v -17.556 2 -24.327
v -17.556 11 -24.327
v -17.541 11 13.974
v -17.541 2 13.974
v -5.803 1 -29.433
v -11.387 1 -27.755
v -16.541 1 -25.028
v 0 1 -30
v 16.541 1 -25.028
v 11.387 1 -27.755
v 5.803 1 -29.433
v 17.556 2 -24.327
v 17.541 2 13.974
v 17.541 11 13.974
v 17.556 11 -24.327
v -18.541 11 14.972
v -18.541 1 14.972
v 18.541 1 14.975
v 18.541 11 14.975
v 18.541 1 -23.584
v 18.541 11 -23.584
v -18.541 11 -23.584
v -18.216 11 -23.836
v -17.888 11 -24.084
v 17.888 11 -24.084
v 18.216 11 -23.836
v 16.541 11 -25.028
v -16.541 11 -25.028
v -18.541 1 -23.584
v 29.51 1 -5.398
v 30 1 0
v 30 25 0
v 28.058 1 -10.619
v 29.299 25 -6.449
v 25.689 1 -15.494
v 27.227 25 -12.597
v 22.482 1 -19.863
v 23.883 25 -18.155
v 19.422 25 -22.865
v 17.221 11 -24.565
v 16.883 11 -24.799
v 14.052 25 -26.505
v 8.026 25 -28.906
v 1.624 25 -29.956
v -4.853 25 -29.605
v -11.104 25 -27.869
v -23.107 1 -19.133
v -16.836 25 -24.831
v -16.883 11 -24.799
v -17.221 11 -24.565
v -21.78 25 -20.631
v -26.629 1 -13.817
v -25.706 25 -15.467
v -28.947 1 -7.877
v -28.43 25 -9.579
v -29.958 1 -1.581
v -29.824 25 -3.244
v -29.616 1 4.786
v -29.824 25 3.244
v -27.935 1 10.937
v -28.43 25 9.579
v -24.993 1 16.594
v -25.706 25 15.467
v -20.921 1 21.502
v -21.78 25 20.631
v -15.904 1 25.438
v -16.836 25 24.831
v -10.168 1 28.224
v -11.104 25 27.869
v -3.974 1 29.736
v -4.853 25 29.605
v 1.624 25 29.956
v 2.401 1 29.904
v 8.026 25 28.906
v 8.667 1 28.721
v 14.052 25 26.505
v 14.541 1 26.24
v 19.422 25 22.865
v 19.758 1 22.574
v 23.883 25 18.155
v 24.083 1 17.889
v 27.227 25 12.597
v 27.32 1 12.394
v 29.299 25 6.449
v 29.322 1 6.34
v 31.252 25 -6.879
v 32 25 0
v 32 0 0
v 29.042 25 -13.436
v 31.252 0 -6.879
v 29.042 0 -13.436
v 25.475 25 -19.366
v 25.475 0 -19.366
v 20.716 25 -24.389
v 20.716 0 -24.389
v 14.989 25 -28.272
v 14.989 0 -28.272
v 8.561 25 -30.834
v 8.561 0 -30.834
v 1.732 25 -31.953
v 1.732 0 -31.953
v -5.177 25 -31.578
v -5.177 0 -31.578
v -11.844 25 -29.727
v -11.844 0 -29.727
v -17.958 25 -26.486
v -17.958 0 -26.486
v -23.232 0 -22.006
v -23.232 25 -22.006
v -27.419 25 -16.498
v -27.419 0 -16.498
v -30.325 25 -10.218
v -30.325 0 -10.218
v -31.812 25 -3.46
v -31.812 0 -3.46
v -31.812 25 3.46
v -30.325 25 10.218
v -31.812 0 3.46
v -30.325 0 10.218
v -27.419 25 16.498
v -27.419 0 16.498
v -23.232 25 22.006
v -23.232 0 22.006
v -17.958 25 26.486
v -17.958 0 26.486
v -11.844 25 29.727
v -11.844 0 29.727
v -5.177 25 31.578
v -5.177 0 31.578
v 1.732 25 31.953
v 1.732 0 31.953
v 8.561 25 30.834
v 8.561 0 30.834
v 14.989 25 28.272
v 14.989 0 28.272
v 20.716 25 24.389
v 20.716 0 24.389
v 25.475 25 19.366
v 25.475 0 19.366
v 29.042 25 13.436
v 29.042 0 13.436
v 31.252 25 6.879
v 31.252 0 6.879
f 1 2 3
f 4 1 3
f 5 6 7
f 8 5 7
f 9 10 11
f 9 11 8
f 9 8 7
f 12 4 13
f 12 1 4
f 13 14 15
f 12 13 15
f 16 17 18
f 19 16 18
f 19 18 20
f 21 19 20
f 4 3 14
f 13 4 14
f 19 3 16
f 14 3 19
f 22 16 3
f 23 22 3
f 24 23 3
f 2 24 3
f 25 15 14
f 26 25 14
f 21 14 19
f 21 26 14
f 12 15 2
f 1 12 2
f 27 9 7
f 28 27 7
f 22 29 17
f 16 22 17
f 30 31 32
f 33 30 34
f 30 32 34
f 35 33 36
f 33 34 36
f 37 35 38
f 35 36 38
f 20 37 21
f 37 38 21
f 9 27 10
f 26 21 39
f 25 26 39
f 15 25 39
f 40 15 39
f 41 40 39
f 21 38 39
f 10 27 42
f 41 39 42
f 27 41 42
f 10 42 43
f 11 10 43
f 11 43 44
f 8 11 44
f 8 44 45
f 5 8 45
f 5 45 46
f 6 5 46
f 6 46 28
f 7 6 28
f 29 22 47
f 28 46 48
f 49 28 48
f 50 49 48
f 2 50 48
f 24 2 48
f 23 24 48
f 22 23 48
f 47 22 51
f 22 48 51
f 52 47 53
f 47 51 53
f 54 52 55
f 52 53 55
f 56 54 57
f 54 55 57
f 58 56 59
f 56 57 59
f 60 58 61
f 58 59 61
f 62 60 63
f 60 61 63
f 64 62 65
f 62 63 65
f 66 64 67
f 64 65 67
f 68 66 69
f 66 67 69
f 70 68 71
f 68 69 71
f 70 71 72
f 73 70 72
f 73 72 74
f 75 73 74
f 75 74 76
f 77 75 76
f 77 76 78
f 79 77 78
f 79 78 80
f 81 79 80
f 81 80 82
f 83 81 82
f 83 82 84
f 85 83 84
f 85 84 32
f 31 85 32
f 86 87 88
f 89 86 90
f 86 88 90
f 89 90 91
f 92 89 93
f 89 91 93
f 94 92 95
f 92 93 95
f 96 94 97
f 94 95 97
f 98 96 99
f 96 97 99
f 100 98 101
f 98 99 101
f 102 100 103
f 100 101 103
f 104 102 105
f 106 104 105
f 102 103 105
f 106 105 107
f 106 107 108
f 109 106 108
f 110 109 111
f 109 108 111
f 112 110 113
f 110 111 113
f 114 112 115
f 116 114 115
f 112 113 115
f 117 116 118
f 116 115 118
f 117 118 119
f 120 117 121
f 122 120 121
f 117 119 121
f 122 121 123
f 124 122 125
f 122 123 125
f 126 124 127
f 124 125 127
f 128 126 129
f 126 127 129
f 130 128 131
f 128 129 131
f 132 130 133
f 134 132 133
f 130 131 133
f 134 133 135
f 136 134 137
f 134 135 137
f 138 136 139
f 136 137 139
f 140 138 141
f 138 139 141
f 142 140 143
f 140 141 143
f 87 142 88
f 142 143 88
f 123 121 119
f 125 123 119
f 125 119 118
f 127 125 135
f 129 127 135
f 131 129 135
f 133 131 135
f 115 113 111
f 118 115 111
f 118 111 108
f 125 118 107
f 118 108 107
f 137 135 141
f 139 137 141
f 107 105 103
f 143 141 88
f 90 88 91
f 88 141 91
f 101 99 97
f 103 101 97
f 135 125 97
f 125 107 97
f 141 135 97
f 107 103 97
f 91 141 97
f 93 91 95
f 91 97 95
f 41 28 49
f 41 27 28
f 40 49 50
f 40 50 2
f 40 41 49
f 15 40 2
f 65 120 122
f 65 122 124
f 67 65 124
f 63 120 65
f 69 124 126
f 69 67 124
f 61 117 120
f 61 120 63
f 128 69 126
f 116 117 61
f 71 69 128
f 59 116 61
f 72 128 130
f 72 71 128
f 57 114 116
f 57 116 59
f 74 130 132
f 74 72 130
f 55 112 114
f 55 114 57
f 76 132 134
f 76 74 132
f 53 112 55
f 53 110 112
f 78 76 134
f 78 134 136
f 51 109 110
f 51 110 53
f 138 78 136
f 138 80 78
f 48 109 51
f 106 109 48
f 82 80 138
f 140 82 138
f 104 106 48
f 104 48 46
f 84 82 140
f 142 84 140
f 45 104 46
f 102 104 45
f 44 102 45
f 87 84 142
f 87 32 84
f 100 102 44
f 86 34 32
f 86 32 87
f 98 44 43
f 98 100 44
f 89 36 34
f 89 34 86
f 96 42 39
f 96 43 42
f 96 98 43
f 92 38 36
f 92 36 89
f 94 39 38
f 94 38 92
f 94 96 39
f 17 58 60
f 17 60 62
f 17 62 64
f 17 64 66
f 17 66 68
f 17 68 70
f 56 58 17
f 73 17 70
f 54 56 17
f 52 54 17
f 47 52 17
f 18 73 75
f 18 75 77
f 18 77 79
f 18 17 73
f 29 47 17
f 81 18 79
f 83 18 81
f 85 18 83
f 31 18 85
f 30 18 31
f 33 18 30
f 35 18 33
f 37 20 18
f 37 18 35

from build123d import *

# Parameters (mm, degrees)
SKETCH2_R           = 32
BOSS_EXTRUDE1_DEPTH = 25
SKETCH3_R           = 30
CUT_EXTRUDE1_DEPTH  = 24
BOSS_EXTRUDE2_DEPTH = 10
CUT_EXTRUDE2_DEPTH  = 9


with BuildPart() as part:
    # Sketch2 → Boss-Extrude1 (new body)
    with BuildSketch(Plane(origin=(0, 0, 0), x_dir=(1, 0, 0), z_dir=(0, 1, 0))):
        Circle(SKETCH2_R)
    extrude(amount=BOSS_EXTRUDE1_DEPTH)

    # Sketch3 → Cut-Extrude1 (cut)
    with BuildSketch(Plane(origin=(0, 25, 0), x_dir=(1, 0, 0), z_dir=(0, 1, 0))):
        Circle(SKETCH3_R)
    extrude(amount=-CUT_EXTRUDE1_DEPTH, mode=Mode.SUBTRACT)

    # Sketch4 → Boss-Extrude2 (add)
    with BuildSketch(Plane(origin=(0, 1, 0), x_dir=(1, 0, 0), z_dir=(0, 1, 0))):
        with BuildLine():
            Line((-18.541196676, -14.972239163), (18.541196676, -14.975032814))
            Line((18.541196676, -14.975032814), (18.541196676, 23.584402172))
            ThreePointArc((18.541196676, 23.584402172), (17.556036053, 24.32664379), (16.541196676, 25.027760837))
            Line((16.541196676, 25.027760837), (-16.541196676, 25.027760837))
            ThreePointArc((-16.541196676, 25.027760837), (-17.556036053, 24.32664379), (-18.541196676, 23.584402172))
            Line((-18.541196676, 23.584402172), (-18.541196676, -14.972239163))
        make_face()
    extrude(amount=BOSS_EXTRUDE2_DEPTH)

    # Sketch5 → Cut-Extrude2 (cut)
    with BuildSketch(Plane(origin=(0, 11, 0), x_dir=(1, 0, 0), z_dir=(0, 1, 0))):
        Polygon((-17.541196676, -13.973635989), (17.541196676, -13.973635989), (17.556036053, 24.32664379), (-17.556036053, 24.32664379), align=None)
    extrude(amount=-CUT_EXTRUDE2_DEPTH, mode=Mode.SUBTRACT)


solid = part.part
